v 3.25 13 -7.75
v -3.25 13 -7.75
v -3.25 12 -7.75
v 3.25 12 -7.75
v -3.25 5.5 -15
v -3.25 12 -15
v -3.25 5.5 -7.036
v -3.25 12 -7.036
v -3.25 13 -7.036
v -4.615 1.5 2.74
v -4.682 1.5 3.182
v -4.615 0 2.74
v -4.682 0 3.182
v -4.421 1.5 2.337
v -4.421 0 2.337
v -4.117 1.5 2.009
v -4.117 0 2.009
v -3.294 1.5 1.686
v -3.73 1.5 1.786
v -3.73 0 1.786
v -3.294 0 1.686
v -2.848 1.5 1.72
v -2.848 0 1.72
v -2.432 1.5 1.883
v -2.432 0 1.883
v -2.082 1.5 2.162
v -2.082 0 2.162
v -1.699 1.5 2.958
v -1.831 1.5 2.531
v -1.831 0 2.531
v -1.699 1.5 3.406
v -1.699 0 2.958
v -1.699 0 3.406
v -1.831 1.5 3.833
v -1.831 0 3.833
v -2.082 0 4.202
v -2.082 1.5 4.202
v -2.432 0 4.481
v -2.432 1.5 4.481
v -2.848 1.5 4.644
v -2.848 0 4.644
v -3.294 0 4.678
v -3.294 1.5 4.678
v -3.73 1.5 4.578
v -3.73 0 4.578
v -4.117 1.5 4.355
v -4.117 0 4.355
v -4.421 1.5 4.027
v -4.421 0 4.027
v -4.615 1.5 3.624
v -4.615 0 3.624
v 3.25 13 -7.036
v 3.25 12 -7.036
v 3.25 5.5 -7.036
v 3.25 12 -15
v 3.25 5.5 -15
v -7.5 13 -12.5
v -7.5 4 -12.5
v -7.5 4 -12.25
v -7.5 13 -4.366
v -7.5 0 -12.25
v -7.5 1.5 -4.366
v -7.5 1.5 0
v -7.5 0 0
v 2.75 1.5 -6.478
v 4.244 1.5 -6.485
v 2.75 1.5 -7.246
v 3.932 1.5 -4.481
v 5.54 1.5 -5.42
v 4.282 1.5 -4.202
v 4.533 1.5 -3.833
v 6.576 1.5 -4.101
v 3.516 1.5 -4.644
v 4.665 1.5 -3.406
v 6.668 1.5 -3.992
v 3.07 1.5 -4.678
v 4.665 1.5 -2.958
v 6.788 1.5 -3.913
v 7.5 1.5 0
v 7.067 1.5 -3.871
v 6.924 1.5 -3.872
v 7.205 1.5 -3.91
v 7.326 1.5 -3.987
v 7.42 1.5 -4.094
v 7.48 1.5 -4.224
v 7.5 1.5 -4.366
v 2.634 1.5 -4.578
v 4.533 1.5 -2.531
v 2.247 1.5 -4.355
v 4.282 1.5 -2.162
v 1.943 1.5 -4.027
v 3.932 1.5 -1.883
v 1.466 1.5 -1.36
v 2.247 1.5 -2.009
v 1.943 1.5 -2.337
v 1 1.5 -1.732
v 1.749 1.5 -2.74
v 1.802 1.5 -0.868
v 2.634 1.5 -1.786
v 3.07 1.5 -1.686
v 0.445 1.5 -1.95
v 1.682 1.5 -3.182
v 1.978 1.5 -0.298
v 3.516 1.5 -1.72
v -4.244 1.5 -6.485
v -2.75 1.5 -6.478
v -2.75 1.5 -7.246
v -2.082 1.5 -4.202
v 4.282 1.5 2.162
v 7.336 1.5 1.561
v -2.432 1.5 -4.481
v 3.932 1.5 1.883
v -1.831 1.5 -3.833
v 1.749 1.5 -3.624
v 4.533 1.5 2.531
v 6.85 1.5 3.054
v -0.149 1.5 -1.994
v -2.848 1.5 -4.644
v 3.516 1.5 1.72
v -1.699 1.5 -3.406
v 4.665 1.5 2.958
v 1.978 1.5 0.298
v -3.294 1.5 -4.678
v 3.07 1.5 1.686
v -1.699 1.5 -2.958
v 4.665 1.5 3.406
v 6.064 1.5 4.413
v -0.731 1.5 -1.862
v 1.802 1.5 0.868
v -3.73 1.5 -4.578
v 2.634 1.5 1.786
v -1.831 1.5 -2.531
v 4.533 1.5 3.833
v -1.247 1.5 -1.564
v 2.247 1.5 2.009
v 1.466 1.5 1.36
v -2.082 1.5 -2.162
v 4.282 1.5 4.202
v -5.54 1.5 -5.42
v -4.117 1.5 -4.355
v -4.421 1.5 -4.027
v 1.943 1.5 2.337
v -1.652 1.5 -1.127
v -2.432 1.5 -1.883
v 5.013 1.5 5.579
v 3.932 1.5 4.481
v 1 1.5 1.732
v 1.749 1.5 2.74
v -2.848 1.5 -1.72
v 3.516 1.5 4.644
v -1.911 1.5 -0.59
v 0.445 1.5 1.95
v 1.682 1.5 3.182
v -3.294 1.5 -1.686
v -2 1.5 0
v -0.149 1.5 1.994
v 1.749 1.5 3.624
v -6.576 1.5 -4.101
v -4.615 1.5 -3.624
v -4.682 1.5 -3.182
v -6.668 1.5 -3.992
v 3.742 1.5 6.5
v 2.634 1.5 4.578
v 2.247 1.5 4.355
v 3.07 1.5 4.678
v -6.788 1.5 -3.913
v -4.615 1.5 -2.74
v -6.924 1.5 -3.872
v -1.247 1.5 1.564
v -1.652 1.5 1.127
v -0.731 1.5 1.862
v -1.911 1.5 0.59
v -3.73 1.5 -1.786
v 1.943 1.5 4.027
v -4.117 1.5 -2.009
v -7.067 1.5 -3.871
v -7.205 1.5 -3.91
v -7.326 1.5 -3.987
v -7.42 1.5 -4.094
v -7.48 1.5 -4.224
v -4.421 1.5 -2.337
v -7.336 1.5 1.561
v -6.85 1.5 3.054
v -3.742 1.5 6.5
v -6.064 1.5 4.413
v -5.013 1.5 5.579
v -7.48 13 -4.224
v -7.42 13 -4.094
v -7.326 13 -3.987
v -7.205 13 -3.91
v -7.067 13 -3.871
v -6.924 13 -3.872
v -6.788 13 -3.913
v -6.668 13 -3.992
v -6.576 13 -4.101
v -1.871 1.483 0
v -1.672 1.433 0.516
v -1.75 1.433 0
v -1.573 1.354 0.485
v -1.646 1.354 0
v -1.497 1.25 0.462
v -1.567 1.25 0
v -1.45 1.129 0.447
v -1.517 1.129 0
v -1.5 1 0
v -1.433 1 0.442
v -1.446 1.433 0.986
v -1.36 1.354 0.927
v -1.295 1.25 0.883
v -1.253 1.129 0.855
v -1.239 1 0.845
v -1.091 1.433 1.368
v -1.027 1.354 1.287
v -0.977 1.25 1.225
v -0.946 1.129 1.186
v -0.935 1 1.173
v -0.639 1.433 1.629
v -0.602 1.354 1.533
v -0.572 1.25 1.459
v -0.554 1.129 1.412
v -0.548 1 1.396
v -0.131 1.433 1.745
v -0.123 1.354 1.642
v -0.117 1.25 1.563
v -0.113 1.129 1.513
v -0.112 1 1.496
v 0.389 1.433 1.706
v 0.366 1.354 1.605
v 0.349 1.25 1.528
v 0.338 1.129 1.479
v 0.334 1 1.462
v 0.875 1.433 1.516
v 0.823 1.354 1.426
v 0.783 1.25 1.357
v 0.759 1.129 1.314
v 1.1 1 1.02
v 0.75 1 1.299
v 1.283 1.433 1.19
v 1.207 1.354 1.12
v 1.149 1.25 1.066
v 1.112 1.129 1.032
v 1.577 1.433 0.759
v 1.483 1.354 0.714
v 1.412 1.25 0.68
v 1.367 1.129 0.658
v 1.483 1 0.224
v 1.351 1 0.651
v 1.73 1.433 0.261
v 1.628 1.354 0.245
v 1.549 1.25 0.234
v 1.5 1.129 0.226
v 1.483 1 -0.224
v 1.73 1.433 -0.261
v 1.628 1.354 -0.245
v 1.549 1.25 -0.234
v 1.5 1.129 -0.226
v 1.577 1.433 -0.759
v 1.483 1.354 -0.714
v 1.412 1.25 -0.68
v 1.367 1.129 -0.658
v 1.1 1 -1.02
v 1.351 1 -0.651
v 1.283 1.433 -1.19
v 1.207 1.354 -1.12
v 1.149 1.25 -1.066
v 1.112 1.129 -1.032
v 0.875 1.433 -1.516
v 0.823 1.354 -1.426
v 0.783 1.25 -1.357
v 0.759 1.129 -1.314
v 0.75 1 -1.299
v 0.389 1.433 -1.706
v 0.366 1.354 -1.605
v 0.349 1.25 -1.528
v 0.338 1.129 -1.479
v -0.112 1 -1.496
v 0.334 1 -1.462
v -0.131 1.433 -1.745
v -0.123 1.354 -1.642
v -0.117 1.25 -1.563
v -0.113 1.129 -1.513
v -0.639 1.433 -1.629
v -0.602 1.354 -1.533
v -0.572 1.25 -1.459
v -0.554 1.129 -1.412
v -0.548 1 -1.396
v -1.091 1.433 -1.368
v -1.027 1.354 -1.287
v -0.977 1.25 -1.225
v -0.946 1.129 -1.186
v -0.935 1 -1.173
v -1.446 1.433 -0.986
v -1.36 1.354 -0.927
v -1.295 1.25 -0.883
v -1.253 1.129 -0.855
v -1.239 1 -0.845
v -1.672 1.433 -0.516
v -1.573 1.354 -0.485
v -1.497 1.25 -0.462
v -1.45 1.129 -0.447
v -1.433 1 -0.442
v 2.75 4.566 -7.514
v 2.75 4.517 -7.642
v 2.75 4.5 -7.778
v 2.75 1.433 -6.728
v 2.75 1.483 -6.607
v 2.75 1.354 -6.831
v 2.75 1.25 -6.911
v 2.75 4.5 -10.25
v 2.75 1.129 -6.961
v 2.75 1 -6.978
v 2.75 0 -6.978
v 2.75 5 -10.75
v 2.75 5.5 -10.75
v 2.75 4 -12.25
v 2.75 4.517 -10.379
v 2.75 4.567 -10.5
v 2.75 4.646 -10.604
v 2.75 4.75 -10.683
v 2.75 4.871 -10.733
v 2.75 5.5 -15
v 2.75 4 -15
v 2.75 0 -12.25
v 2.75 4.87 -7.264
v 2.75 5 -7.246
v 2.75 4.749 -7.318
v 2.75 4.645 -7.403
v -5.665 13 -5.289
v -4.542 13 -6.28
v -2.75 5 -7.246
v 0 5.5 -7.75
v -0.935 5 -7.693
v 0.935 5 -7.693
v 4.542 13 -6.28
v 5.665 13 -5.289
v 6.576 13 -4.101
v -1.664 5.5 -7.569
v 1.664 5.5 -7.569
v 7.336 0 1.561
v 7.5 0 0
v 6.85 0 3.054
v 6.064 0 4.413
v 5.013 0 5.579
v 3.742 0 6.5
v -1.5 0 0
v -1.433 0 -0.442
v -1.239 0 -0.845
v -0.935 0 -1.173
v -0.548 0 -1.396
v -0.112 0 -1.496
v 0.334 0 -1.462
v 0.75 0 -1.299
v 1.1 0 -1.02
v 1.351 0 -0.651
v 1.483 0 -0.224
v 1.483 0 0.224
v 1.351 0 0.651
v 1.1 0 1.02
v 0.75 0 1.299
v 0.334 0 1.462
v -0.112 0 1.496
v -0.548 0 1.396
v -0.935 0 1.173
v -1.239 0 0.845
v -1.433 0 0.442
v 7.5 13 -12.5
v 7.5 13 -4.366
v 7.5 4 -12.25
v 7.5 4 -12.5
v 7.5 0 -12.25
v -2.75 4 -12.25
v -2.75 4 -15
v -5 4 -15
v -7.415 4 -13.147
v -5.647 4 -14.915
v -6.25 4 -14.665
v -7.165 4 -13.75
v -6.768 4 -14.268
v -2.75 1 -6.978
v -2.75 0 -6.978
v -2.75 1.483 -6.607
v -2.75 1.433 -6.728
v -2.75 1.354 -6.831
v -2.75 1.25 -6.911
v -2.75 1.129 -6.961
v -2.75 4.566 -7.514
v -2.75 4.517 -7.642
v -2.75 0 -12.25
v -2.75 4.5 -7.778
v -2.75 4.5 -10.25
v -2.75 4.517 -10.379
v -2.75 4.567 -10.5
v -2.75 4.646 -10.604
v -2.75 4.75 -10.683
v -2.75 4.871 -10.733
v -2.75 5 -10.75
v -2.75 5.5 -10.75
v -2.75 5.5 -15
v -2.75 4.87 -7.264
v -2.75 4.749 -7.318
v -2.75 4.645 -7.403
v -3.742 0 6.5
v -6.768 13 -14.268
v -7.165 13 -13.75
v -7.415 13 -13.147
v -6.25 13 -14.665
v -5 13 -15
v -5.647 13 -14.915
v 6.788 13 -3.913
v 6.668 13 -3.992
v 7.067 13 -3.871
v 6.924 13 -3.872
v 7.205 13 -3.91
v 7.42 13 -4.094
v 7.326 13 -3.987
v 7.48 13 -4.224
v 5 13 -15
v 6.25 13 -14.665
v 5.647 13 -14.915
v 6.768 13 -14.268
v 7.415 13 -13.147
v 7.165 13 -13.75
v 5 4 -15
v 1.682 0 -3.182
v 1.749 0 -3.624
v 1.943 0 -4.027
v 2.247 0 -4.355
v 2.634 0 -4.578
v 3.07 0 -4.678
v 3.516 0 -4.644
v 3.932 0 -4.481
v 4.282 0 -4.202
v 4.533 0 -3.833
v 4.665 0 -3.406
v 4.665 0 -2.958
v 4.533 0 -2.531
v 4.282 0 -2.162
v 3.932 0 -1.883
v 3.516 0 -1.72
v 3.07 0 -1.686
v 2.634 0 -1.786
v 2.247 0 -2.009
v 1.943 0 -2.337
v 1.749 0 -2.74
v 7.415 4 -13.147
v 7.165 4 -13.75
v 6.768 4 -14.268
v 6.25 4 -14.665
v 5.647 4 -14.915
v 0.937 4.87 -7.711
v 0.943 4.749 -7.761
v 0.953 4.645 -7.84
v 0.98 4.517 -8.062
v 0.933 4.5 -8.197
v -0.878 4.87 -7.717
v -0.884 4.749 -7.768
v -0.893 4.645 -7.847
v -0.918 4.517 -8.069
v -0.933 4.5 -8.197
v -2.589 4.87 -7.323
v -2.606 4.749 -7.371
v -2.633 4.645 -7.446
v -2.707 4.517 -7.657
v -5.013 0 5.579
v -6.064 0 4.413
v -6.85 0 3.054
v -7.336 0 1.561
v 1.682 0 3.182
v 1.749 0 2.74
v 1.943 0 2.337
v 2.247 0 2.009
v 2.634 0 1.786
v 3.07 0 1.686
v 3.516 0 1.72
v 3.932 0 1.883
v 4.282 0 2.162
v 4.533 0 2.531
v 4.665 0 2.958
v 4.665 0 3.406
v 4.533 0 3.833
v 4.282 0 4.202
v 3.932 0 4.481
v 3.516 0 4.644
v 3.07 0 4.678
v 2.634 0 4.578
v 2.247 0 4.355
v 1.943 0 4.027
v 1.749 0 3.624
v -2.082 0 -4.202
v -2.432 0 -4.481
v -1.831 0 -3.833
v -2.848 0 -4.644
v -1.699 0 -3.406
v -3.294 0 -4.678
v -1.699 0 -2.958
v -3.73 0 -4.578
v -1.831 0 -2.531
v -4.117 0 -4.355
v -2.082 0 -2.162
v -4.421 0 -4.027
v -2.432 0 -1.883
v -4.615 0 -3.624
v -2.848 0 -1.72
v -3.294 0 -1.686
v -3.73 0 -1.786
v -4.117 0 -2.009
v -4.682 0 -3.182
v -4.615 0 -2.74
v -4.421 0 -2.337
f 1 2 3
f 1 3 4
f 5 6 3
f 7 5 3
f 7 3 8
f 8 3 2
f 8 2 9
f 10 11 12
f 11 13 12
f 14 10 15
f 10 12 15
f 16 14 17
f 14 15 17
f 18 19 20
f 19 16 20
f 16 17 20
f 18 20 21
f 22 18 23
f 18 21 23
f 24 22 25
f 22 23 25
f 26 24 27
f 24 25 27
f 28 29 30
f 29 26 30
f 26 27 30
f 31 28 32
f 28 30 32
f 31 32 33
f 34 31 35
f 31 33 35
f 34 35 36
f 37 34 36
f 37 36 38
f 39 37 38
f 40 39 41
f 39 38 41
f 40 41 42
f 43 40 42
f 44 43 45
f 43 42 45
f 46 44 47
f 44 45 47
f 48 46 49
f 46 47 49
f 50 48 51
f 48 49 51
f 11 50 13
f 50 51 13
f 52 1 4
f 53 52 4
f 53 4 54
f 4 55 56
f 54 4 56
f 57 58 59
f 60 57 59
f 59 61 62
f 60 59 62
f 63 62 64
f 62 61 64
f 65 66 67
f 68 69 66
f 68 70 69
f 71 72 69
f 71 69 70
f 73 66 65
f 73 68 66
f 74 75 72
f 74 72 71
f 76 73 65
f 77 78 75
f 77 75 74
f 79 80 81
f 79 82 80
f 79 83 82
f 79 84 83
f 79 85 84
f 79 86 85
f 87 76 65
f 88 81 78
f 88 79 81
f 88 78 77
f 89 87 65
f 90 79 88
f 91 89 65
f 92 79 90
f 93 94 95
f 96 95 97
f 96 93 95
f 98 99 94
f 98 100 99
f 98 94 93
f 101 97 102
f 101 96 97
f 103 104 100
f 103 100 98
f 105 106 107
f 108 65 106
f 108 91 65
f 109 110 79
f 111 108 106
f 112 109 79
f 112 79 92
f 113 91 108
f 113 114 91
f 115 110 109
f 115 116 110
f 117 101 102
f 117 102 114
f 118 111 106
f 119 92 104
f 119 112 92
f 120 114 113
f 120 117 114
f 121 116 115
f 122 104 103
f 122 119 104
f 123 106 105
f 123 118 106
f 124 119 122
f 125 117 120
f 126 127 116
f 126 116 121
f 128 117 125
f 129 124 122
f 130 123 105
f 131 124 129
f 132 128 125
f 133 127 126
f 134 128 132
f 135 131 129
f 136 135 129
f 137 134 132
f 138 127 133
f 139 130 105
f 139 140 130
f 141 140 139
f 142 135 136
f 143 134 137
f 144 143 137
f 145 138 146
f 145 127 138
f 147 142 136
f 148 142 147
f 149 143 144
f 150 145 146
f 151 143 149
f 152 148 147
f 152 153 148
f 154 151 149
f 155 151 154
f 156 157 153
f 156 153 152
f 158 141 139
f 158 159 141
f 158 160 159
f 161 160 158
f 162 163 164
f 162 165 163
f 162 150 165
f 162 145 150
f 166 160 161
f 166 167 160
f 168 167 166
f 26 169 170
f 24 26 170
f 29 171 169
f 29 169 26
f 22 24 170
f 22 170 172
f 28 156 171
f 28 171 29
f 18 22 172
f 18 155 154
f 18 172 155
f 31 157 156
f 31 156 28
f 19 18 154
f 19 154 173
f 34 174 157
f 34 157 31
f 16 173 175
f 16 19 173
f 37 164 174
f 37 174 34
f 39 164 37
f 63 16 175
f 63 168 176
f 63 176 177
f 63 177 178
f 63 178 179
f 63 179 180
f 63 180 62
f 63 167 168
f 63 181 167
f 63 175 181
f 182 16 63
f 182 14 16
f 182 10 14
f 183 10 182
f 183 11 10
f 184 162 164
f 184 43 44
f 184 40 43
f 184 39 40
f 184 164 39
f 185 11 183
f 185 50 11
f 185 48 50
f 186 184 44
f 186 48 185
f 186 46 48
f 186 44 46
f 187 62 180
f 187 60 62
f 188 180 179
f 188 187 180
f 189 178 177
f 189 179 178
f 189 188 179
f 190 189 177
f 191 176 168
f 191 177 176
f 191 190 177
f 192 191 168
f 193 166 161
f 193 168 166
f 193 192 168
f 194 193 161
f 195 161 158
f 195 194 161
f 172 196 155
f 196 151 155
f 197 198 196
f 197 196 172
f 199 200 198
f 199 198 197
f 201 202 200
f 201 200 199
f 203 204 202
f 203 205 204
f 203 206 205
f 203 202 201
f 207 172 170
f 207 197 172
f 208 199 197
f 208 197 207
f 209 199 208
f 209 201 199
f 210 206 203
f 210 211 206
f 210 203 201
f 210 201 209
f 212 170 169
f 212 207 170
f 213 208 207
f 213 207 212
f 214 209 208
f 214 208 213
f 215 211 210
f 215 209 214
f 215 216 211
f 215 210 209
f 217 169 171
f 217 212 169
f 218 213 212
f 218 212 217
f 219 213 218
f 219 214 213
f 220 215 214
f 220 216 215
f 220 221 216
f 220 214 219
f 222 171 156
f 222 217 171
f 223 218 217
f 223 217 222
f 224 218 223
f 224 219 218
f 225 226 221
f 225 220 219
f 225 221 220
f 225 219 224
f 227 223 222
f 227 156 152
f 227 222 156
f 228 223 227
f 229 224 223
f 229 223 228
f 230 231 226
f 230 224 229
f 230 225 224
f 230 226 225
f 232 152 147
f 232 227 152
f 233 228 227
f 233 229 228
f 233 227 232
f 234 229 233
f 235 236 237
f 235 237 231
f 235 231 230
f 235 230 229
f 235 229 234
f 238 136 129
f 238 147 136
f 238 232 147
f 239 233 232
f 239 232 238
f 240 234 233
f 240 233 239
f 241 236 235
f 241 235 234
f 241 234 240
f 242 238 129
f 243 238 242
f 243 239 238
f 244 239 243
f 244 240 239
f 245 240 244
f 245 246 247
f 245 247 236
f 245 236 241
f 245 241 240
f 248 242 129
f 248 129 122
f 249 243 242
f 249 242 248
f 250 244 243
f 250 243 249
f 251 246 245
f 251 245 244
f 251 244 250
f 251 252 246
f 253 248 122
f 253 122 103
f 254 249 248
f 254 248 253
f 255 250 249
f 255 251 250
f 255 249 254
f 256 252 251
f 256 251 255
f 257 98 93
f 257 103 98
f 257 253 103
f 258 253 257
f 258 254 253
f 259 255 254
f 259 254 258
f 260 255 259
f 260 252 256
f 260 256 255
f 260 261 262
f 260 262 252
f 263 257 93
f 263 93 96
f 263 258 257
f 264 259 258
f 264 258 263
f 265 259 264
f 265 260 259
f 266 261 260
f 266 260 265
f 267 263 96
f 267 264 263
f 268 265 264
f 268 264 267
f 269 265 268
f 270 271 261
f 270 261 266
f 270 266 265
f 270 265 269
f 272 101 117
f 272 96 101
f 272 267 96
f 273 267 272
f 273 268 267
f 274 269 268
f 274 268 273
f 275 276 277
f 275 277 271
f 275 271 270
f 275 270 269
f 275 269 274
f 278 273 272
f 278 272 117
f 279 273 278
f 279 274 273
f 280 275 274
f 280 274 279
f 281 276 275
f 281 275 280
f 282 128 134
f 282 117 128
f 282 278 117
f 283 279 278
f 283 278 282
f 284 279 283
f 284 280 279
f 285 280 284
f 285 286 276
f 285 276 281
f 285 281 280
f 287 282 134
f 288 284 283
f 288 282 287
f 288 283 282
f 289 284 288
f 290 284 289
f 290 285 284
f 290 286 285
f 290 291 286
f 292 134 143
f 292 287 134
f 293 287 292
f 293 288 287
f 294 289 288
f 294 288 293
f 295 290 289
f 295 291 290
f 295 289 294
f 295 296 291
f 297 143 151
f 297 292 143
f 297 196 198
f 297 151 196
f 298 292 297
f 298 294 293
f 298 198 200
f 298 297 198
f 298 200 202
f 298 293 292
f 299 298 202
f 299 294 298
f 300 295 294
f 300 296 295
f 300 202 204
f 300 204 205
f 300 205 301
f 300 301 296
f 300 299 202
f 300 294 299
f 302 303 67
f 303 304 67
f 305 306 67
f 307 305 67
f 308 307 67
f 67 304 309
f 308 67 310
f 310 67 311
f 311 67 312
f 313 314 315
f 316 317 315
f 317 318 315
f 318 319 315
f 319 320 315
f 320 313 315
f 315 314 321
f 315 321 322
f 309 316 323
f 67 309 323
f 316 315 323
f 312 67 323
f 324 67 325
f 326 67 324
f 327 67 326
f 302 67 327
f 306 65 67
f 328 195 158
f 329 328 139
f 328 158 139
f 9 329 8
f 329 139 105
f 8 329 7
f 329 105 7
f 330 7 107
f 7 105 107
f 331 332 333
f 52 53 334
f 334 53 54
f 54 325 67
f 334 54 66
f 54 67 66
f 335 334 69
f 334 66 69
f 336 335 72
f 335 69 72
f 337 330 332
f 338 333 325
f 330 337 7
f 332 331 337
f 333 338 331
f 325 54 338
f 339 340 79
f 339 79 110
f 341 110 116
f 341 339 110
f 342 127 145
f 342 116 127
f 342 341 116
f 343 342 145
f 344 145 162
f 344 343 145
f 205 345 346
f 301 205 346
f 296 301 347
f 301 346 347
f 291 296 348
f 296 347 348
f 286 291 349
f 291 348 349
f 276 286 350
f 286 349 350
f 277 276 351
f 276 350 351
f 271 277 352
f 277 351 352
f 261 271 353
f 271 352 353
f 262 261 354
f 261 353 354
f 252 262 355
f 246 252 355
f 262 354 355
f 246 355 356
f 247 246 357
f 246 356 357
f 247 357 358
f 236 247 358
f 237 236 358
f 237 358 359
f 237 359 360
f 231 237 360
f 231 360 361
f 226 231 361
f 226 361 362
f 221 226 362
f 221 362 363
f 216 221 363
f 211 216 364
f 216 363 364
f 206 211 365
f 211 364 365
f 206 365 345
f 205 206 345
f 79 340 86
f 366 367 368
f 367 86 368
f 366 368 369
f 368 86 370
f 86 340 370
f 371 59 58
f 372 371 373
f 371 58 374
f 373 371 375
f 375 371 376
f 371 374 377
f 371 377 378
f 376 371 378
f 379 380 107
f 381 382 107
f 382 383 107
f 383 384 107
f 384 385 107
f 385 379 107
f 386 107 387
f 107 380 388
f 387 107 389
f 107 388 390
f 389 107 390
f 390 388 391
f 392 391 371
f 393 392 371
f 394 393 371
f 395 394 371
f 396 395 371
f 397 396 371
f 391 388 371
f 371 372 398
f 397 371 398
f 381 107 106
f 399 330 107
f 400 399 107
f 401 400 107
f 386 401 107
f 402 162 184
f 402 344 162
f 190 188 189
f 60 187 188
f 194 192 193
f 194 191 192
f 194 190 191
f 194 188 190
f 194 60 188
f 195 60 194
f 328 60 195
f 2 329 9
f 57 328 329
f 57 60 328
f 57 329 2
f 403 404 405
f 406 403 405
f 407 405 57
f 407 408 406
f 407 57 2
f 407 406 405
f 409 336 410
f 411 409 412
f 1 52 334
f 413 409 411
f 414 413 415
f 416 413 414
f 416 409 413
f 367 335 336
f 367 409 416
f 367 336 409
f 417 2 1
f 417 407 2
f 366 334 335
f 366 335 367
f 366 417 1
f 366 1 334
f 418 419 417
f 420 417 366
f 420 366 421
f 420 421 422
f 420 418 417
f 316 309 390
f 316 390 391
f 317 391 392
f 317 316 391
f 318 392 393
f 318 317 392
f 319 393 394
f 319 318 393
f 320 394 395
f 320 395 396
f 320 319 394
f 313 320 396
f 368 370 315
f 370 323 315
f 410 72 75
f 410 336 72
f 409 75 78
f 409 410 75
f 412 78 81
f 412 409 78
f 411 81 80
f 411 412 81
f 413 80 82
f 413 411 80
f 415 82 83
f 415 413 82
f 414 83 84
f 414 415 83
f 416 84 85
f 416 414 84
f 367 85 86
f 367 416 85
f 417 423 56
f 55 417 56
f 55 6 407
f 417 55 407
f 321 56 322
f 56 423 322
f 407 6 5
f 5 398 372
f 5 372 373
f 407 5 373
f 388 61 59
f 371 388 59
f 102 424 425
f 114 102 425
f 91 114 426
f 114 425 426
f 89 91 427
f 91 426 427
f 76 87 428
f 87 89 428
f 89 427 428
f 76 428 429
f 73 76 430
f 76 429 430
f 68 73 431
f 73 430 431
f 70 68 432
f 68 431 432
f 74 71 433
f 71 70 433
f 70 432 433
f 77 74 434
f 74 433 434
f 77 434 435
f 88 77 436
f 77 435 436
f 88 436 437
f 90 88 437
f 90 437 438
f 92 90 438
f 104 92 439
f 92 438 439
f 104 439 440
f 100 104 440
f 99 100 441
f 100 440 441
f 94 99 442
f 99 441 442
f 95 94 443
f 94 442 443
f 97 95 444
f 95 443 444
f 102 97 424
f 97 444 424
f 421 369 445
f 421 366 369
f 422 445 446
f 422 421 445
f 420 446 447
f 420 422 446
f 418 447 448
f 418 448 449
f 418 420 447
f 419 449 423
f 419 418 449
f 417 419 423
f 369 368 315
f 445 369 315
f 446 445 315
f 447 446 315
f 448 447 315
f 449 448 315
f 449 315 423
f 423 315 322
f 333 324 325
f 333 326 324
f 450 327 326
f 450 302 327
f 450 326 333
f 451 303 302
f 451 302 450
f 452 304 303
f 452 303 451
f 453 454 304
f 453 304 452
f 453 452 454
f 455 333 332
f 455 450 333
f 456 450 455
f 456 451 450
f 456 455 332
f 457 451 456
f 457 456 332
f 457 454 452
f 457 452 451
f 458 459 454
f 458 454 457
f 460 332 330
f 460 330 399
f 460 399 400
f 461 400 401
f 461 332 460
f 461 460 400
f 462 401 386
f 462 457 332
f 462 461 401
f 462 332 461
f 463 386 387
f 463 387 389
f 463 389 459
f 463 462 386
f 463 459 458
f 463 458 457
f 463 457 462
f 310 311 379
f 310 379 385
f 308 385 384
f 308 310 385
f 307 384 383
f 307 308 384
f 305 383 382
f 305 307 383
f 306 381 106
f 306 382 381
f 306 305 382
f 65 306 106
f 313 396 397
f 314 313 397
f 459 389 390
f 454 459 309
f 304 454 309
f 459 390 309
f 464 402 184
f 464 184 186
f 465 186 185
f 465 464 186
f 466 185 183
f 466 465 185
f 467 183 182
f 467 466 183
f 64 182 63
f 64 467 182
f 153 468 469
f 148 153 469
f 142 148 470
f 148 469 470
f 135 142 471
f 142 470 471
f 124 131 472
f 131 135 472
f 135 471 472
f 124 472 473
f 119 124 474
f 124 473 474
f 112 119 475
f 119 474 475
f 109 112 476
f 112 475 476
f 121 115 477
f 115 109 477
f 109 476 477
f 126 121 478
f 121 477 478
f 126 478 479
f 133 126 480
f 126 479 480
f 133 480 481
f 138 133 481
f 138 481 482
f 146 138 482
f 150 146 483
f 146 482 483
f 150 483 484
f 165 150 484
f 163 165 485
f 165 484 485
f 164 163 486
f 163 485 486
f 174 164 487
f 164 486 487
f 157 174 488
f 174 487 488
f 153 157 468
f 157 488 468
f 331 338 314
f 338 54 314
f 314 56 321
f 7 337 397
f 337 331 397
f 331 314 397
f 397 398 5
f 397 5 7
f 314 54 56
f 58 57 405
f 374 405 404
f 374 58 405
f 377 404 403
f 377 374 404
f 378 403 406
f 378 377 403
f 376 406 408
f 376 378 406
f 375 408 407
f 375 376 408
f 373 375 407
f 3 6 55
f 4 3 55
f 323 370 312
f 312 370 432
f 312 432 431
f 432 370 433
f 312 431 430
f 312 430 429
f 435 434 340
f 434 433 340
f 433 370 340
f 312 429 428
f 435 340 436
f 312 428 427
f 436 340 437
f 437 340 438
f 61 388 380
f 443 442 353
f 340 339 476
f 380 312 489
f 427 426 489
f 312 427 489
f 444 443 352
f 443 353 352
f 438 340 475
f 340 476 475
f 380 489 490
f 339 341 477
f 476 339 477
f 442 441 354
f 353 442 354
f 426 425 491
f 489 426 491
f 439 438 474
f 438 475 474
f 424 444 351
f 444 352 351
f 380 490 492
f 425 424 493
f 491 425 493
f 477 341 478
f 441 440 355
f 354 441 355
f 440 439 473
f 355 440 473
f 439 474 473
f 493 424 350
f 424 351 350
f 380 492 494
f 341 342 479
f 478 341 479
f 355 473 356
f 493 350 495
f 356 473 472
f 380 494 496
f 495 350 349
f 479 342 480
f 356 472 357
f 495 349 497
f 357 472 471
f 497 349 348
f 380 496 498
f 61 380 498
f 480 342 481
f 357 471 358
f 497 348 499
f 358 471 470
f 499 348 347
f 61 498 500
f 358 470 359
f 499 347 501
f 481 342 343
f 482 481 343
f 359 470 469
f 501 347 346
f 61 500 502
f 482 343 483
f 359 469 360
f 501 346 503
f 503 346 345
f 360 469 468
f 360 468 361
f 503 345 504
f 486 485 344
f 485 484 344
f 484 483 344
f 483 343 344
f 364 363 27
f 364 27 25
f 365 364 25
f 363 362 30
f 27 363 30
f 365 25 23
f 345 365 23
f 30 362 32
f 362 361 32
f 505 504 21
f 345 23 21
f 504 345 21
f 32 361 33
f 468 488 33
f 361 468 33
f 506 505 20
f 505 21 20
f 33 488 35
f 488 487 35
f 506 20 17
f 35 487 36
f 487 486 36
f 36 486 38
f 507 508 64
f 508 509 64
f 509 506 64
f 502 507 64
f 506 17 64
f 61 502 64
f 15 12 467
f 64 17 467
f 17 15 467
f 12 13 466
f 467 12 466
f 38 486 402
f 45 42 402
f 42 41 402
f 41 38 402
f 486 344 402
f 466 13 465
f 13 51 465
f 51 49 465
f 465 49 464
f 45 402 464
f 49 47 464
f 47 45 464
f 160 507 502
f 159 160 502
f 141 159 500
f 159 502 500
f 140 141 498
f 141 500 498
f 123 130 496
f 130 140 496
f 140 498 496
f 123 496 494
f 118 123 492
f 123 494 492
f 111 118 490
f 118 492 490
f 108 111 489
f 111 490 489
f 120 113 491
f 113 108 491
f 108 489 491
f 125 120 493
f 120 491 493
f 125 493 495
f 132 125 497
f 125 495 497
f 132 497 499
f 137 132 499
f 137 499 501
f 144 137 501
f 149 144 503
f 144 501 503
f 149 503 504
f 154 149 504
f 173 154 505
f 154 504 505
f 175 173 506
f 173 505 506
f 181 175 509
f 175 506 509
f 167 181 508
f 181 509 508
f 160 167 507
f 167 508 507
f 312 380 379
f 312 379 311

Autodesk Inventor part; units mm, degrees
sketch "Náčrt1" plane through (0, 0, 0) normal (0, 1, 0) x (-1, 0, 0)
  arc A0 (2.75, -6.9776) -> (-2.75, -6.9776) centre (0, 0) ccw
  line L0 (-7.5, 0) -> (-7.5, -15)
  line L1 (7.5, -15) -> (7.5, 0)
  line L2 (2.75, -6.9776) -> (-2.75, -6.9776)
  line L3 (-2.75, -6.9776) -> (-2.75, -15)
  line L4 (2.75, -15) -> (2.75, -6.9776)
  circle A1 centre (4.5, 0) radius 1.5
  circle A2 centre (0, 0) radius 1.5
  circle A3 centre (0, 4.5) radius 1.5
  circle A4 centre (-4.5, 0) radius 1.5
  circle A5 centre (0, -4.5) radius 1.5
  line L5 (-7.5, -15) -> (-2.75, -15)
  line L6 (2.75, -15) -> (7.5, -15)
  circle A6 centre (3.182, 3.182) radius 1.5
  circle A7 centre (0, 4.5) radius 1.5
  circle A8 centre (-3.182, 3.182) radius 1.5
  circle A9 centre (-4.5, 0) radius 1.5
  circle A10 centre (-3.182, -3.182) radius 1.5
  circle A11 centre (0, -4.5) radius 1.5
  circle A12 centre (3.182, -3.182) radius 1.5
  line L7 (-1.5, 0) -> (-3, 0)
  line L8 (-6, 0) -> (-7.5, 0)
  line L9 (7.5, 0) -> (6, 0)
  line L10 (3, 0) -> (1.5, 0)
  dimension "d0" = 15
  dimension "d1" = 3
  dimension "d2" = 3
  dimension "d5" = 360
  dimension "d7" = 4.5
  dimension "d8" = 5.5
  dimension "d9" = 15
  dimension "d10" = 15
  dimension "d13" = 360
extrude "Vysunutí1" add sketch "Náčrt1" along normal blind 1.5 contours L2 A0 L8 A4 L7 A2 L10 A1 L9 | A0 L1 L6 L4 | L9 A1 L10 A2 L7 A4 L8 A0 | L3 L5 L0 A0 | A1 | A4 | A3 | A5
ref_plane "Pracovní rovina1" through (0, 1.5, 0) normal (0, 1, 0) x (1, 0, 0)
sketch "Náčrt3" plane through (0, 1.5, 0) normal (0, 1, 0) x (1, 0, 0)
  arc A0 (7.5, 1.9526) -> (-7.5, 1.9526) centre (0, 0) ccw
  line L0 (-7.5, 15) -> (-7.5, 0) projected
  line L1 (7.5, 15) -> (2.75, 15) projected
  line L2 (7.5, 1.9526) -> (7.5, 15)
  line L3 (7.5, 15) -> (-7.5, 15)
  line L4 (-7.5, 15) -> (-7.5, 1.9526)
  dimension "d18" = 15.5
extrude "Vysunutí2" add sketch "Náčrt3" along normal blind 11.5
ref_plane "Pracovní rovina2" through (-2.75, 0, -15) normal (0, 0, -1) x (-1, 0, 0)
sketch "Náčrt4" plane through (-2.75, 0, -15) normal (0, 0, -1) x (-1, 0, 0)
  line L0 (-5.5, 0) -> (-5.5, 1.5) projected
  line L1 (-5.5, 1.5) -> (0, 1.5)
  line L2 (0, 1.5) -> (0, 4.5)
  line L3 (0, 4.5) -> (-5.5, 4.5)
  line L4 (-5.5, 4.5) -> (-5.5, 1.5)
  point P0 (-2.75, 0)
  dimension "d51" = 3
extrude "Vysunutí3" cut sketch "Náčrt4" against normal blind 9
fillet "Zaoblení1" radius 0.5 1 edges at (7.5, 7.25, -1.9526)
fillet "Zaoblení2" radius 0.5 1 edges at (-7.5, 7.25, -1.9526)
sketch "Náčrt9" plane through (-2.75, 0, -15) normal (0, 0, -1) x (-1, 0, 0)
  line L0 (0, 0) -> (0, 4.5) projected
  line L1 (0, 0) -> (4.75, 0) projected
  line L2 (4.75, 0) -> (4.75, 13) projected
  line L3 (-10.25, 13) -> (4.75, 13) projected
  line L4 (-10.25, 0) -> (-10.25, 13) projected
  line L5 (-10.25, 0) -> (-5.5, 0) projected
  line L6 (-5.5, 0) -> (-5.5, 4.5) projected
  line L7 (-6, 5.5) -> (0.5, 5.5)
  line L8 (0.5, 5.5) -> (0.5, 12)
  line L9 (0.5, 12) -> (-6, 12)
  line L10 (-6, 12) -> (-6, 5.5)
  line L11 (-5.5, 4.5) -> (0, 4.5) projected
  point P0 (-2.75, 0)
  dimension "d28" = 6.5
  dimension "d29" = 6.5
  dimension "d31" = 0.5
  dimension "d50" = 1
extrude "Vysunutí5" cut sketch "Náčrt9" against normal blind 8 contours L10 L9 L8 L7
fillet "Zaoblení4" radius 0.5 1 edges at (1.5, 1.5, 0)
fillet "Zaoblení5" radius 2.5 2 edges at (-7.5, 6.5, -15) (7.5, 6.5, -15)
fillet "Zaoblení6" radius 0.5 2 edges at (0, 4.5, -7.75) (0, 1.5, -6.9776)
ref_plane "Pracovní rovina3" through (0, 13, 0) normal (0, 1, 0) x (1, 0, 0)
sketch "Náčrt10" plane through (0, 13, 0) normal (0, 1, 0) x (1, 0, 0)
  arc A0 (3.25, 7.0356) -> (-3.25, 7.0356) centre (0, 0) ccw projected
  line L0 (-3.25, 15) -> (-3.25, 7.0356) projected
  line L1 (3.25, 15) -> (-3.25, 15) projected
  line L2 (3.25, 15) -> (3.25, 7.0356) projected
  line L3 (3.25, 7.0356) -> (-3.25, 7.0356)
  line L4 (-3.25, 7.0356) -> (-3.25, 7.75)
  line L5 (-3.25, 7.75) -> (3.25, 7.75)
  line L6 (3.25, 7.75) -> (3.25, 7.0356)
extrude "Vysunutí6" cut sketch "Náčrt10" against normal blind 2 contours L3 A0 | A0 L5 L2 | A0 L0 L5
sketch "Sketch11" plane through (-7.5, 0, 0) normal (-1, 0, 0) x (0, 0, 1)
  line L0 (-15, 0) -> (-6.9776, 0) projected
  line L1 (-15, 0) -> (-12.25, 0)
  line L2 (-12.25, 0) -> (-12.25, 4)
  line L3 (-12.25, 4) -> (-15, 4)
  line L4 (-15, 4) -> (-15, 0)
  point P0 (0, 0)
  dimension "d42" = 2.75
  dimension "d43" = 4
extrude "Extrusion7" cut sketch "Sketch11" against normal through all
sketch "Sketch12" plane through (0, 0, 0) normal (0, -1, 0) x (1, 0, 0)
  line L0 (7.5804, 6.5) -> (-7.5515, 6.5)
  line L1 (-7.5515, 6.5) -> (-7.5515, 9.7793)
  line L2 (-7.5515, 9.7793) -> (7.5804, 9.7793)
  line L3 (7.5804, 9.7793) -> (7.5804, 6.5)
  arc A0 (7.5, 0) -> (-7.5, 0) centre (0, 0) ccw projected
  dimension "d46" = 1
extrude "Extrusion8" cut sketch "Sketch12" against normal through all
sketch "Sketch13" plane through (-2.75, 1.5, -7.2457) normal (1, 0, 0) x (0, 0, -1)
  line L0 (7.7543, 2.5) -> (7.7543, 3) projected
  line L1 (7.7543, 3) -> (3.5043, 3)
  line L2 (3.5043, 3) -> (3.5043, 4)
  line L3 (3.5043, 4) -> (7.7543, 4)
  line L4 (7.7543, 4) -> (7.7543, 3)
  line L5 (5.0043, -1.5) -> (5.0043, 2.5) projected
  point P0 (-7.2457, -1.5)
  dimension "d52" = 1.5
extrude "Extrusion9" cut sketch "Sketch13" along normal up to surface (5.5 mm away)
fillet "Fillet8" radius 0.5 1 edges at (0, 4.5, -10.75)
equation "\"d9\" = d0"
equation "\"d29\" = d28"
equation "\"d31\" = -0.5 * d8 + 0.5 * d28"
properties part number "uchyt motoru-final"
